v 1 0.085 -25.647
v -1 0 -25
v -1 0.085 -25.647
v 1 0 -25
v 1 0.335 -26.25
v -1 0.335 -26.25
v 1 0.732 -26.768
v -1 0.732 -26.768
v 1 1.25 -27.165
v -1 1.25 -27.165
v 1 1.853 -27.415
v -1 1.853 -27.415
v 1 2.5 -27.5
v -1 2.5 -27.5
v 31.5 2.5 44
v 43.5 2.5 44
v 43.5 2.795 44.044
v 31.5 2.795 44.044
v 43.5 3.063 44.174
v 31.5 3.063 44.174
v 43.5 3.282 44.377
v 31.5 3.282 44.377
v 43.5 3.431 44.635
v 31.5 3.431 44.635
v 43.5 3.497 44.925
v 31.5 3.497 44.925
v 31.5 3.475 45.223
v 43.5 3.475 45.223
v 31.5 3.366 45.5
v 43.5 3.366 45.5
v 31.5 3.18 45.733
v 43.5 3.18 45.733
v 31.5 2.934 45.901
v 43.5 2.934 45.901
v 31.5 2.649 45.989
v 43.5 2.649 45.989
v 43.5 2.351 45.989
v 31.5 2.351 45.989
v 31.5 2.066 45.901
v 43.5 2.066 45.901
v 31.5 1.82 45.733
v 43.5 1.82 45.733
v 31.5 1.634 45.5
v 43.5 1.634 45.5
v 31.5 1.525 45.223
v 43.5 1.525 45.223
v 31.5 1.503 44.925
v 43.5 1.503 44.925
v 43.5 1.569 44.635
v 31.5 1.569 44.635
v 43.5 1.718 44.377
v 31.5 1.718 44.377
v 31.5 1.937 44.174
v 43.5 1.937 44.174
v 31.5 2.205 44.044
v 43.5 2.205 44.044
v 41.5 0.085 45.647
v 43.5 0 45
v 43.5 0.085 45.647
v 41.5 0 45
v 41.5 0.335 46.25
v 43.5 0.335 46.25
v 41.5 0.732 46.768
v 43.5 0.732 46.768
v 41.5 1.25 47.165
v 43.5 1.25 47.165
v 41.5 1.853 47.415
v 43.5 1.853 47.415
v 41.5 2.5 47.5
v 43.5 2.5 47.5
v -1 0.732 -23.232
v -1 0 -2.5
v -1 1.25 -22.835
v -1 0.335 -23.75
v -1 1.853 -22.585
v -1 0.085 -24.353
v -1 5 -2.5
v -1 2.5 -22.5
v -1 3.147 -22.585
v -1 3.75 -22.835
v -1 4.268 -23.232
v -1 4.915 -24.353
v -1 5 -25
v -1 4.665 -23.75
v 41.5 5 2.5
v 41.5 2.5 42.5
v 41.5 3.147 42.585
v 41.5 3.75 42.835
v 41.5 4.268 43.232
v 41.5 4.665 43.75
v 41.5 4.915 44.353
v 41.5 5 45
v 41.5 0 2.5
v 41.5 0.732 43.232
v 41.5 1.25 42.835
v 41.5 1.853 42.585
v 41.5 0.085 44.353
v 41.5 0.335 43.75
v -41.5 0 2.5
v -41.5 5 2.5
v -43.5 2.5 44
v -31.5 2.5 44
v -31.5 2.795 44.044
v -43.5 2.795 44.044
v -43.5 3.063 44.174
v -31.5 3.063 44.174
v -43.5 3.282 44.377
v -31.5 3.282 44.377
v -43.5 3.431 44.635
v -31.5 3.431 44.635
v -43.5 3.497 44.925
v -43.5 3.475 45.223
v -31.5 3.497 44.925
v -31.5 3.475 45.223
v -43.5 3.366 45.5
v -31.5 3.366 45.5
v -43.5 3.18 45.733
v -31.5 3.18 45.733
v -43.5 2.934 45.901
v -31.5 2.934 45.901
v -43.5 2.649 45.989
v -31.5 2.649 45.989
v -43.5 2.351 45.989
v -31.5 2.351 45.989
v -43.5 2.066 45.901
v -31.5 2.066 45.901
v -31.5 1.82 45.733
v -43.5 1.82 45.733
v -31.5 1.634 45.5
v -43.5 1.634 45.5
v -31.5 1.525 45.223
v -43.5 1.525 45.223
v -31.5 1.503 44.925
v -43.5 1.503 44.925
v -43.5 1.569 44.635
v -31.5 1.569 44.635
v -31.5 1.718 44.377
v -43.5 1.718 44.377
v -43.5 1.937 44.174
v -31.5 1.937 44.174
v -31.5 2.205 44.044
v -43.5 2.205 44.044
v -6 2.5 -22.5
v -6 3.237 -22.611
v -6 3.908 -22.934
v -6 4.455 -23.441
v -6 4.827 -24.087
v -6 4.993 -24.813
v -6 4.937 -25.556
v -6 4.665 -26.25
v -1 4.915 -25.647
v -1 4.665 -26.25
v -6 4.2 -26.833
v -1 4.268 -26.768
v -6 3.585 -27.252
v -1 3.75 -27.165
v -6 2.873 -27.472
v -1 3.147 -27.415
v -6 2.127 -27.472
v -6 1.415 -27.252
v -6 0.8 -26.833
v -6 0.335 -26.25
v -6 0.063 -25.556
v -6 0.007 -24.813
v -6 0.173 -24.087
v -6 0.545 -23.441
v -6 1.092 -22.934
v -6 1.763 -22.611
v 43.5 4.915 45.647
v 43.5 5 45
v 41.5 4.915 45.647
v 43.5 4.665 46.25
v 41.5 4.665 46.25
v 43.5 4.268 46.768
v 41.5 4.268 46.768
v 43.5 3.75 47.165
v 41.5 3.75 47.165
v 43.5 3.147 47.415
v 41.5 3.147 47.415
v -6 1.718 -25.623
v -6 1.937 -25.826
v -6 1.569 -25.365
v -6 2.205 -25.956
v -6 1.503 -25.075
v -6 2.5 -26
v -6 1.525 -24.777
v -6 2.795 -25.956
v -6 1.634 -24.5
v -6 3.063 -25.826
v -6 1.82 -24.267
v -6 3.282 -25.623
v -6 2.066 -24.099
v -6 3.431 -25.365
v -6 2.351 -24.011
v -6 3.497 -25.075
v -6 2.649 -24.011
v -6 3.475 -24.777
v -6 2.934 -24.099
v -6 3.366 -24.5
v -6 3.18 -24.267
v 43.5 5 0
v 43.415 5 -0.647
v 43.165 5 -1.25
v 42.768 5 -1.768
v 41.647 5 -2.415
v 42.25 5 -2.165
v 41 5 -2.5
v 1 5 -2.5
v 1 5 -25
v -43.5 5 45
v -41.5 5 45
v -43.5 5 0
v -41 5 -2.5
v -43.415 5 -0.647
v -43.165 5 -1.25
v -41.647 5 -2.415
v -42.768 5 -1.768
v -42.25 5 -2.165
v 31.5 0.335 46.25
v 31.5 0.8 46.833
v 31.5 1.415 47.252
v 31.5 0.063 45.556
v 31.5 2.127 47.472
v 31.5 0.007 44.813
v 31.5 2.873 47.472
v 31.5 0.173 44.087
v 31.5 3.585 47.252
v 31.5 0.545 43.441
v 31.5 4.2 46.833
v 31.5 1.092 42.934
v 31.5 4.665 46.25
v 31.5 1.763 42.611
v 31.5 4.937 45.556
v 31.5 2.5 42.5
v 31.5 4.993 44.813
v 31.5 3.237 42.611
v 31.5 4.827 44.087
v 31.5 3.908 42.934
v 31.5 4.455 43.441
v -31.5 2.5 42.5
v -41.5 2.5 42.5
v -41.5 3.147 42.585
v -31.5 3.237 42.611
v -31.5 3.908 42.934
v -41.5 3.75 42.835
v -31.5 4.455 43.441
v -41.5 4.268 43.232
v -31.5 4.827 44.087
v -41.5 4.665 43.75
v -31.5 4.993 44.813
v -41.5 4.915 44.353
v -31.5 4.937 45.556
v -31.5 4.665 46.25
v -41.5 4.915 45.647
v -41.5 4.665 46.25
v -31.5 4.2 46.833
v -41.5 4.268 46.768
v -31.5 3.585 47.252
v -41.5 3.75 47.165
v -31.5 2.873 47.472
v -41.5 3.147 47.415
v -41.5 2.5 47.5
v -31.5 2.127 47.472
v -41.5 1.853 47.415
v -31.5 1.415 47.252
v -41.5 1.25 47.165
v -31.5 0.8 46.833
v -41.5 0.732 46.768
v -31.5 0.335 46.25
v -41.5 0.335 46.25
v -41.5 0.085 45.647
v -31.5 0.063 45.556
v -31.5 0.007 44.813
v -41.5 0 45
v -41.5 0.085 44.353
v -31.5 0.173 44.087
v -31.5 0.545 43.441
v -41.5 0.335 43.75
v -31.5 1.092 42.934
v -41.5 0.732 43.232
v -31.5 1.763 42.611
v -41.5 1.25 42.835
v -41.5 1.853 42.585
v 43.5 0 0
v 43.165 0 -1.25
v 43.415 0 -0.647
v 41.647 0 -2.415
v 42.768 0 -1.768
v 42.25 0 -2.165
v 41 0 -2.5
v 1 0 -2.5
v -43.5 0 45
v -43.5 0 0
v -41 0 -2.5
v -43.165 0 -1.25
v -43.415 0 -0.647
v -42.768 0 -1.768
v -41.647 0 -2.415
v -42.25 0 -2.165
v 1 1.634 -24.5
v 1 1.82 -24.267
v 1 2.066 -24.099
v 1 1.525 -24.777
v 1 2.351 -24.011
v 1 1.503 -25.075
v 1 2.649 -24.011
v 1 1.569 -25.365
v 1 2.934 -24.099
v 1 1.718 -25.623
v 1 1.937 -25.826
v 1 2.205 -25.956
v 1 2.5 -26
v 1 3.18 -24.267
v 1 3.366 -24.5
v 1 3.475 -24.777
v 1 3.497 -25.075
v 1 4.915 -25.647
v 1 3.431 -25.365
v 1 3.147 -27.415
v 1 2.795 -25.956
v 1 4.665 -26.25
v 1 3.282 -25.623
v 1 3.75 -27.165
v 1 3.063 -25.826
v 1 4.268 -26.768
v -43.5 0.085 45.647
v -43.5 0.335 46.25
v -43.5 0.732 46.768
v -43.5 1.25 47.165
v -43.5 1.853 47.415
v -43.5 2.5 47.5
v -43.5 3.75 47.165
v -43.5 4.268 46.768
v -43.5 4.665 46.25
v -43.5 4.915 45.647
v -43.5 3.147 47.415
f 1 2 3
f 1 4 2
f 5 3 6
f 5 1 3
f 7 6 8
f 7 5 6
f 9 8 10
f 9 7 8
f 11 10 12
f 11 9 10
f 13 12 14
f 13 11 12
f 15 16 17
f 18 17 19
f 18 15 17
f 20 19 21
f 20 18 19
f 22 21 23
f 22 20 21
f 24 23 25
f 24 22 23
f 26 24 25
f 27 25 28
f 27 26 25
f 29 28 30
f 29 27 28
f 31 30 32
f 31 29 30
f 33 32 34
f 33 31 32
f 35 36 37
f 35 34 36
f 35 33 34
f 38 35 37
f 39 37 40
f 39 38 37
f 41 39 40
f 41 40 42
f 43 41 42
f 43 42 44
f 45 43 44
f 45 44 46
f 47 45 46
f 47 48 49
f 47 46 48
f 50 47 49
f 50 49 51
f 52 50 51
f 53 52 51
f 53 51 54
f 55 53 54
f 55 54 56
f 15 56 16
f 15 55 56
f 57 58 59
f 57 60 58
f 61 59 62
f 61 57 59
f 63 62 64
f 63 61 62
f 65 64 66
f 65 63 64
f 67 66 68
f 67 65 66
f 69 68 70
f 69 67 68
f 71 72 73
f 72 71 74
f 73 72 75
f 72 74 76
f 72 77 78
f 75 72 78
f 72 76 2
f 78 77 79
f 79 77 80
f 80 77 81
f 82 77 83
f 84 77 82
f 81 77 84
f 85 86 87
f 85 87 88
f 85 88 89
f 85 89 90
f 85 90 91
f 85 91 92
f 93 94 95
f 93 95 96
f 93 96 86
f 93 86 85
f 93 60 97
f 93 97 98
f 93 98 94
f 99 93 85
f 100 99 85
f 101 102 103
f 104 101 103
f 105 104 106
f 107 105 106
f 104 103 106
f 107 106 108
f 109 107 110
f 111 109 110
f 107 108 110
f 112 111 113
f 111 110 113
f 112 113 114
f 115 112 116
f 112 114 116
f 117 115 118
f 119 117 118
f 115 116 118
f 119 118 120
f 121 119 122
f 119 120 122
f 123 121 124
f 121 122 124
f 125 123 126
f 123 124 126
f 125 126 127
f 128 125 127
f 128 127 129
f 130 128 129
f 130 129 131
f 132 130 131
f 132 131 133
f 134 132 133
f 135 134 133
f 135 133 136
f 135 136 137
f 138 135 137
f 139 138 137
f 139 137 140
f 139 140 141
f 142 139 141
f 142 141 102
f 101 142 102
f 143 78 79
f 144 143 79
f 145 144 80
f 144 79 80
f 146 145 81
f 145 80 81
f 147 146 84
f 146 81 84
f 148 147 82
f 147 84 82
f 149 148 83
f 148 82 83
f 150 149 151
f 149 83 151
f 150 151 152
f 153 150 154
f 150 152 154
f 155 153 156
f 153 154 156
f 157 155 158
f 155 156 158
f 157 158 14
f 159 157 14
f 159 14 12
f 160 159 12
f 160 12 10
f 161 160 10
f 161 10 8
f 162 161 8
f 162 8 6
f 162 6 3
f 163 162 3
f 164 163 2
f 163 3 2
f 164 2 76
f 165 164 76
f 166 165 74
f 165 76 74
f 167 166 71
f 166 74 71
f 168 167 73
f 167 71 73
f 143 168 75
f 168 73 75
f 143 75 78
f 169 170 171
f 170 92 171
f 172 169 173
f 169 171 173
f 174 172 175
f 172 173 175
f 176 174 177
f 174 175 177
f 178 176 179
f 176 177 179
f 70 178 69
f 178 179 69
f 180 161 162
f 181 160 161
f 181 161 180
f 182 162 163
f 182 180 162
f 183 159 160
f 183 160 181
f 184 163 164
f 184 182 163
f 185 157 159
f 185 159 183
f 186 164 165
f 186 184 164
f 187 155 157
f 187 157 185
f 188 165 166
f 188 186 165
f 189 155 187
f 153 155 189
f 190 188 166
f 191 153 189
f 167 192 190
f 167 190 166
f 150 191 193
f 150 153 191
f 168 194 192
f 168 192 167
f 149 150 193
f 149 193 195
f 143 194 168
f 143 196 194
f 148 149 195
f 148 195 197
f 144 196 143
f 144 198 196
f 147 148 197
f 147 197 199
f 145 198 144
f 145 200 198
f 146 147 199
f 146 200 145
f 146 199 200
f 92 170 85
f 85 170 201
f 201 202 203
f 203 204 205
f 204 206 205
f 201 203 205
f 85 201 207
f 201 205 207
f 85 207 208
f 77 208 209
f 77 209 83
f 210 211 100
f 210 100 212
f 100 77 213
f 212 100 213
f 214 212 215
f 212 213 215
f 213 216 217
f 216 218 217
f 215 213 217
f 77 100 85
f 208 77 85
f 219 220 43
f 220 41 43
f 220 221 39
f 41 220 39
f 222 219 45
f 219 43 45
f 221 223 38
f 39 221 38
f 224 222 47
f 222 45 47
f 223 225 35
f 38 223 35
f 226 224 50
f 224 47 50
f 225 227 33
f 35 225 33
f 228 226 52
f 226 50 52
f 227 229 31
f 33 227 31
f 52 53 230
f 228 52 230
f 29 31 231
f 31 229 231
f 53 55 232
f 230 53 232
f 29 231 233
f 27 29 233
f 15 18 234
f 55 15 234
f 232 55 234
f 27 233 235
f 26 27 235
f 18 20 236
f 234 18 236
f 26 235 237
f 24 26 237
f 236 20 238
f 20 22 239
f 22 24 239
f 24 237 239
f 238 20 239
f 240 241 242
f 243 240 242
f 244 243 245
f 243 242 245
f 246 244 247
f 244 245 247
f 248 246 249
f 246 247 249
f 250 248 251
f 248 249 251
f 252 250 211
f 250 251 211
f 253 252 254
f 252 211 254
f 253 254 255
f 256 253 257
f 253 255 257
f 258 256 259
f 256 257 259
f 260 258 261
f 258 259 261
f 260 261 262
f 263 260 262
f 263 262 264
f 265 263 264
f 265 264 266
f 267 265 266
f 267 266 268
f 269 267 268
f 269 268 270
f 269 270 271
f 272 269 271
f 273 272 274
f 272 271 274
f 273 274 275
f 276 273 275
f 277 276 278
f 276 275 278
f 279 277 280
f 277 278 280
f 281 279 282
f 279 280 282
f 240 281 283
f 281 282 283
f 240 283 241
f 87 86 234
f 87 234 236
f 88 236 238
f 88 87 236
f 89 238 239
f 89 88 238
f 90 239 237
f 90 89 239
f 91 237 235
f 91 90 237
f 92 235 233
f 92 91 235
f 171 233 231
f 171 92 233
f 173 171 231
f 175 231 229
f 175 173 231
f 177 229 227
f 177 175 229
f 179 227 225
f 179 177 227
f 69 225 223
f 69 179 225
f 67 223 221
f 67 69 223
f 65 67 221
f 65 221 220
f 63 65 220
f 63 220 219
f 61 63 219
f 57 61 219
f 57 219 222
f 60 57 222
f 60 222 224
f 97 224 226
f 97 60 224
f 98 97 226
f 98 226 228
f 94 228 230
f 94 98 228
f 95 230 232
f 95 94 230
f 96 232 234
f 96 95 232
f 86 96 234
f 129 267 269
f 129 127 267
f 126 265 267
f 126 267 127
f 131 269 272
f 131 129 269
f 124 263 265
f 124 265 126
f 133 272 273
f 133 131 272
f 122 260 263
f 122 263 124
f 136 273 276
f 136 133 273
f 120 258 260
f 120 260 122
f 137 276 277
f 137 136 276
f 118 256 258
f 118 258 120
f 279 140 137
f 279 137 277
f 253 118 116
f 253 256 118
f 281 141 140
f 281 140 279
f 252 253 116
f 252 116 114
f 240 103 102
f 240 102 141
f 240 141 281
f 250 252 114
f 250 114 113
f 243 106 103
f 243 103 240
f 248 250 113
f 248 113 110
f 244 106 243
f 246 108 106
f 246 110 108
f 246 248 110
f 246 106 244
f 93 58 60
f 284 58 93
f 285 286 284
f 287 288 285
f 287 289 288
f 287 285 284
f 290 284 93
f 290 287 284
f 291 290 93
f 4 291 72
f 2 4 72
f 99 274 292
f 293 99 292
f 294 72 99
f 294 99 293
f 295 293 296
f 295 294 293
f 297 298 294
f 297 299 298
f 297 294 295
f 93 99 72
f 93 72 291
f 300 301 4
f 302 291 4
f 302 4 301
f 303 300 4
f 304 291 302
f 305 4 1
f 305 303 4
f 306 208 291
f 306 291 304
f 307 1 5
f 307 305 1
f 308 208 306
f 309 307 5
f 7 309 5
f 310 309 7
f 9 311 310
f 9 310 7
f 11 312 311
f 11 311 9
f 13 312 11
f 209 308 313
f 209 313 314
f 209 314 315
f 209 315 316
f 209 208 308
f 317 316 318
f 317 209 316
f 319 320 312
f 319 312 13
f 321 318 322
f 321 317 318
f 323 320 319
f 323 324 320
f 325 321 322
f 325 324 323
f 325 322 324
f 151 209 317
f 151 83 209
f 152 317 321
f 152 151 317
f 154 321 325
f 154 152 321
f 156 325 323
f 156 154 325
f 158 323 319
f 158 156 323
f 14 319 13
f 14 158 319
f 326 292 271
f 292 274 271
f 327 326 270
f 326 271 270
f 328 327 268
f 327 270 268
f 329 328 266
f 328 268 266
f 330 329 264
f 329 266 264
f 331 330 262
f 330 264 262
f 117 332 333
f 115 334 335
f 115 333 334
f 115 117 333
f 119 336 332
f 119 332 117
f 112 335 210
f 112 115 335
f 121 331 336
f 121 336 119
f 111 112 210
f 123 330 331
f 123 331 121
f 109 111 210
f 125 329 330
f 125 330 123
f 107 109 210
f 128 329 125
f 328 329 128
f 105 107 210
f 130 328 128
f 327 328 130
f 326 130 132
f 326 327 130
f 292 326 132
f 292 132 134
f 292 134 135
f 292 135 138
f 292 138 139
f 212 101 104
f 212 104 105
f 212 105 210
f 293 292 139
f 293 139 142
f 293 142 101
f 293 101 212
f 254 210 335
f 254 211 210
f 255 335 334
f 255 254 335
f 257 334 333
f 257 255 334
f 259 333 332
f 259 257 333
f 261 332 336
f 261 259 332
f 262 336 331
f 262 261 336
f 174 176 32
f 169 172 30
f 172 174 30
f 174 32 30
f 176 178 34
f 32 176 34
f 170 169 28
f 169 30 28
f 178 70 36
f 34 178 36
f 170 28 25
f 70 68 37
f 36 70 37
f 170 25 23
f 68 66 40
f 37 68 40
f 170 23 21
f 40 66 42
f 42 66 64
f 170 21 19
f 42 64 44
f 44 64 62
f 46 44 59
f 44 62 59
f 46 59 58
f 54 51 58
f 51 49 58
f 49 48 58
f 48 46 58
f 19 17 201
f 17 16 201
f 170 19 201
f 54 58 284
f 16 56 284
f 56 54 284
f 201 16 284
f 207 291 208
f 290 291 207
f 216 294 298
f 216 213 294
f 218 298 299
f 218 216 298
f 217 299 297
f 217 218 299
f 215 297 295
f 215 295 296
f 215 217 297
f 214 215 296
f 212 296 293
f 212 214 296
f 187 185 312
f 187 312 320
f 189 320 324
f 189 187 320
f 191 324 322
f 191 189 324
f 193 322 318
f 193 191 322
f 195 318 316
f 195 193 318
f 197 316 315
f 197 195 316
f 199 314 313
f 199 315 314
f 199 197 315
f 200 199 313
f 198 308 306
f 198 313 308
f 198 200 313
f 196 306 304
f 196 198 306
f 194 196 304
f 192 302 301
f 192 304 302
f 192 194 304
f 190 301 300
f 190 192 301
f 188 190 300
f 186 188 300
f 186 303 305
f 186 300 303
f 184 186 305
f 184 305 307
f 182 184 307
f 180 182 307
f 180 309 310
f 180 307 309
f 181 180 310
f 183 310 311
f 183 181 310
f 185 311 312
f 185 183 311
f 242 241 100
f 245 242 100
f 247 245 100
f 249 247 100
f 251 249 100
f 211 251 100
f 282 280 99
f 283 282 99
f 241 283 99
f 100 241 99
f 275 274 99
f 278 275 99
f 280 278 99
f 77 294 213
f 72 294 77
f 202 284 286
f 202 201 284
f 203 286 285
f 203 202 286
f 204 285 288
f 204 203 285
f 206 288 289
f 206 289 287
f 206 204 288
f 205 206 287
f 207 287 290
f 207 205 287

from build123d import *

# Parameters (mm, degrees)
ESBO_O1_W                  = 87
ESBO_O1_H                  = 5
RESSALTO_EXTRUS_O1_DEPTH   = 5
ESBO_O2_W                  = 2
ESBO_O2_H                  = 50
RESSALTO_EXTRUS_O2_DEPTH   = 5
FILETE1_R                  = 2.5
ESBO_O6_R                  = 2.5
RESSALTO_EXTRUS_O4_DEPTH   = 10
ESBO_O7_R                  = 1
CORTE_EXTRUS_O3_DEPTH      = 89.917096219
FILETE1_OF_ESPELHAR1_R     = 2.5
FILETE2_R                  = 2.5
ESBO_O4_W                  = 30
ESBO_O4_H                  = 5
RESSALTO_EXTRUS_O3_DEPTH   = 1
FILETE3_R                  = 2.5
ESBO_O8_R                  = 2.5
RESSALTO_EXTRUS_O5_DEPTH   = 5
CORTE_EXTRUS_O2_DEPTH      = 65.602631525
CORTE_EXTRUS_O2_DEPTH_BACK = 65.602631525
ESBO_O5_R                  = 1


with BuildPart() as part:
    # Esboço1 → Ressalto-extrusão1 (new body)
    with BuildSketch(Plane(origin=(0, 0, 0), x_dir=(1, 0, 0), z_dir=(0, 1, 0))):
        Rectangle(ESBO_O1_W, ESBO_O1_H)
    extrude(amount=RESSALTO_EXTRUS_O1_DEPTH)

    # Esboço2 → Ressalto-extrusão2 (add)
    with BuildSketch(Plane(origin=(0, 0, 0), x_dir=(1, 0, 0), z_dir=(0, 1, 0))):
        with Locations((-42.5, -22.5)):
            Rectangle(ESBO_O2_W, ESBO_O2_H)
    ressalto_extrus_o2 = extrude(amount=RESSALTO_EXTRUS_O2_DEPTH)

    # Filete1
    filete1_edges = [part.edges().sort_by_distance(p)[0] for p in [
        (-42.5, 0, 47.5),
        (-42.5, 5, 47.5),
    ]]
    fillet(filete1_edges, radius=FILETE1_R - 0.0001)  # a hair under: the kernel refuses the full size

    # Esboço6 → Ressalto-extrusão4 (add)
    with BuildSketch(Plane(origin=(-41.5, 0, 0), x_dir=(0, 0, -1), z_dir=(1, 0, 0))):
        with Locations((-45, 2.5)):
            Circle(ESBO_O6_R)
    ressalto_extrus_o4 = extrude(amount=RESSALTO_EXTRUS_O4_DEPTH)

    # Esboço7 → Corte-extrusão3 (cut, through all)
    with BuildSketch(Plane(origin=(-31.5, 0, 0), x_dir=(0, 0, -1), z_dir=(1, 0, 0))):
        with Locations((-45, 2.5)):
            Circle(ESBO_O7_R)
    corte_extrus_o3 = extrude(amount=-CORTE_EXTRUS_O3_DEPTH, mode=Mode.SUBTRACT)

    # Espelhar1: Ressalto-extrusão2, Ressalto-extrusão4, Corte-extrusão3 across plane
    add(ressalto_extrus_o2.mirror(Plane(origin=(0, 0, 0), x_dir=(0, 0, 1), z_dir=(1, 0, 0))))
    add(ressalto_extrus_o4.mirror(Plane(origin=(0, 0, 0), x_dir=(0, 0, 1), z_dir=(1, 0, 0))))
    add(corte_extrus_o3.mirror(Plane(origin=(0, 0, 0), x_dir=(0, 0, 1), z_dir=(1, 0, 0))), mode=Mode.SUBTRACT)

    # Filete1 of Espelhar1
    filete1_of_espelhar1_edges = [part.edges().sort_by_distance(p)[0] for p in [
        (42.5, 0, 47.5),
        (42.5, 5, 47.5),
    ]]
    fillet(filete1_of_espelhar1_edges, radius=FILETE1_OF_ESPELHAR1_R - 0.0001)  # a hair under: the kernel refuses the full size

    # Filete2
    filete2_edges = [part.edges().sort_by_distance(p)[0] for p in [
        (-43.5, 2.5, -2.5),
        (43.5, 2.5, -2.5),
    ]]
    fillet(filete2_edges, radius=FILETE2_R)

    # Esboço4 → Ressalto-extrusão3 (add, symmetric)
    with BuildSketch(Plane(origin=(0, 0, 0), x_dir=(0, 0, -1), z_dir=(1, 0, 0))):
        with Locations((12.5, 2.5)):
            Rectangle(ESBO_O4_W, ESBO_O4_H)
    extrude(amount=RESSALTO_EXTRUS_O3_DEPTH, both=True)

    # Filete3
    filete3_edges = [part.edges().sort_by_distance(p)[0] for p in [
        (0, 5, -27.5),
        (0, 0, -27.5),
    ]]
    fillet(filete3_edges, radius=FILETE3_R - 0.0001)  # a hair under: the kernel refuses the full size

    # Esboço8 → Ressalto-extrusão5 (add)
    with BuildSketch(Plane.ZY.offset(1)):
        with Locations((-25, 2.5)):
            Circle(ESBO_O8_R)
    extrude(amount=RESSALTO_EXTRUS_O5_DEPTH)

    # Esboço5 → Corte-extrusão2 (cut, two sides: drawn at the far end of the back side and taken through both)
    with BuildSketch(Plane(origin=(0, 0, 0), x_dir=(0, 0, -1), z_dir=(1, 0, 0)).offset(-CORTE_EXTRUS_O2_DEPTH_BACK)):
        with Locations((25, 2.5)):
            Circle(ESBO_O5_R)
    extrude(amount=CORTE_EXTRUS_O2_DEPTH + CORTE_EXTRUS_O2_DEPTH_BACK, mode=Mode.SUBTRACT)


solid = part.part
